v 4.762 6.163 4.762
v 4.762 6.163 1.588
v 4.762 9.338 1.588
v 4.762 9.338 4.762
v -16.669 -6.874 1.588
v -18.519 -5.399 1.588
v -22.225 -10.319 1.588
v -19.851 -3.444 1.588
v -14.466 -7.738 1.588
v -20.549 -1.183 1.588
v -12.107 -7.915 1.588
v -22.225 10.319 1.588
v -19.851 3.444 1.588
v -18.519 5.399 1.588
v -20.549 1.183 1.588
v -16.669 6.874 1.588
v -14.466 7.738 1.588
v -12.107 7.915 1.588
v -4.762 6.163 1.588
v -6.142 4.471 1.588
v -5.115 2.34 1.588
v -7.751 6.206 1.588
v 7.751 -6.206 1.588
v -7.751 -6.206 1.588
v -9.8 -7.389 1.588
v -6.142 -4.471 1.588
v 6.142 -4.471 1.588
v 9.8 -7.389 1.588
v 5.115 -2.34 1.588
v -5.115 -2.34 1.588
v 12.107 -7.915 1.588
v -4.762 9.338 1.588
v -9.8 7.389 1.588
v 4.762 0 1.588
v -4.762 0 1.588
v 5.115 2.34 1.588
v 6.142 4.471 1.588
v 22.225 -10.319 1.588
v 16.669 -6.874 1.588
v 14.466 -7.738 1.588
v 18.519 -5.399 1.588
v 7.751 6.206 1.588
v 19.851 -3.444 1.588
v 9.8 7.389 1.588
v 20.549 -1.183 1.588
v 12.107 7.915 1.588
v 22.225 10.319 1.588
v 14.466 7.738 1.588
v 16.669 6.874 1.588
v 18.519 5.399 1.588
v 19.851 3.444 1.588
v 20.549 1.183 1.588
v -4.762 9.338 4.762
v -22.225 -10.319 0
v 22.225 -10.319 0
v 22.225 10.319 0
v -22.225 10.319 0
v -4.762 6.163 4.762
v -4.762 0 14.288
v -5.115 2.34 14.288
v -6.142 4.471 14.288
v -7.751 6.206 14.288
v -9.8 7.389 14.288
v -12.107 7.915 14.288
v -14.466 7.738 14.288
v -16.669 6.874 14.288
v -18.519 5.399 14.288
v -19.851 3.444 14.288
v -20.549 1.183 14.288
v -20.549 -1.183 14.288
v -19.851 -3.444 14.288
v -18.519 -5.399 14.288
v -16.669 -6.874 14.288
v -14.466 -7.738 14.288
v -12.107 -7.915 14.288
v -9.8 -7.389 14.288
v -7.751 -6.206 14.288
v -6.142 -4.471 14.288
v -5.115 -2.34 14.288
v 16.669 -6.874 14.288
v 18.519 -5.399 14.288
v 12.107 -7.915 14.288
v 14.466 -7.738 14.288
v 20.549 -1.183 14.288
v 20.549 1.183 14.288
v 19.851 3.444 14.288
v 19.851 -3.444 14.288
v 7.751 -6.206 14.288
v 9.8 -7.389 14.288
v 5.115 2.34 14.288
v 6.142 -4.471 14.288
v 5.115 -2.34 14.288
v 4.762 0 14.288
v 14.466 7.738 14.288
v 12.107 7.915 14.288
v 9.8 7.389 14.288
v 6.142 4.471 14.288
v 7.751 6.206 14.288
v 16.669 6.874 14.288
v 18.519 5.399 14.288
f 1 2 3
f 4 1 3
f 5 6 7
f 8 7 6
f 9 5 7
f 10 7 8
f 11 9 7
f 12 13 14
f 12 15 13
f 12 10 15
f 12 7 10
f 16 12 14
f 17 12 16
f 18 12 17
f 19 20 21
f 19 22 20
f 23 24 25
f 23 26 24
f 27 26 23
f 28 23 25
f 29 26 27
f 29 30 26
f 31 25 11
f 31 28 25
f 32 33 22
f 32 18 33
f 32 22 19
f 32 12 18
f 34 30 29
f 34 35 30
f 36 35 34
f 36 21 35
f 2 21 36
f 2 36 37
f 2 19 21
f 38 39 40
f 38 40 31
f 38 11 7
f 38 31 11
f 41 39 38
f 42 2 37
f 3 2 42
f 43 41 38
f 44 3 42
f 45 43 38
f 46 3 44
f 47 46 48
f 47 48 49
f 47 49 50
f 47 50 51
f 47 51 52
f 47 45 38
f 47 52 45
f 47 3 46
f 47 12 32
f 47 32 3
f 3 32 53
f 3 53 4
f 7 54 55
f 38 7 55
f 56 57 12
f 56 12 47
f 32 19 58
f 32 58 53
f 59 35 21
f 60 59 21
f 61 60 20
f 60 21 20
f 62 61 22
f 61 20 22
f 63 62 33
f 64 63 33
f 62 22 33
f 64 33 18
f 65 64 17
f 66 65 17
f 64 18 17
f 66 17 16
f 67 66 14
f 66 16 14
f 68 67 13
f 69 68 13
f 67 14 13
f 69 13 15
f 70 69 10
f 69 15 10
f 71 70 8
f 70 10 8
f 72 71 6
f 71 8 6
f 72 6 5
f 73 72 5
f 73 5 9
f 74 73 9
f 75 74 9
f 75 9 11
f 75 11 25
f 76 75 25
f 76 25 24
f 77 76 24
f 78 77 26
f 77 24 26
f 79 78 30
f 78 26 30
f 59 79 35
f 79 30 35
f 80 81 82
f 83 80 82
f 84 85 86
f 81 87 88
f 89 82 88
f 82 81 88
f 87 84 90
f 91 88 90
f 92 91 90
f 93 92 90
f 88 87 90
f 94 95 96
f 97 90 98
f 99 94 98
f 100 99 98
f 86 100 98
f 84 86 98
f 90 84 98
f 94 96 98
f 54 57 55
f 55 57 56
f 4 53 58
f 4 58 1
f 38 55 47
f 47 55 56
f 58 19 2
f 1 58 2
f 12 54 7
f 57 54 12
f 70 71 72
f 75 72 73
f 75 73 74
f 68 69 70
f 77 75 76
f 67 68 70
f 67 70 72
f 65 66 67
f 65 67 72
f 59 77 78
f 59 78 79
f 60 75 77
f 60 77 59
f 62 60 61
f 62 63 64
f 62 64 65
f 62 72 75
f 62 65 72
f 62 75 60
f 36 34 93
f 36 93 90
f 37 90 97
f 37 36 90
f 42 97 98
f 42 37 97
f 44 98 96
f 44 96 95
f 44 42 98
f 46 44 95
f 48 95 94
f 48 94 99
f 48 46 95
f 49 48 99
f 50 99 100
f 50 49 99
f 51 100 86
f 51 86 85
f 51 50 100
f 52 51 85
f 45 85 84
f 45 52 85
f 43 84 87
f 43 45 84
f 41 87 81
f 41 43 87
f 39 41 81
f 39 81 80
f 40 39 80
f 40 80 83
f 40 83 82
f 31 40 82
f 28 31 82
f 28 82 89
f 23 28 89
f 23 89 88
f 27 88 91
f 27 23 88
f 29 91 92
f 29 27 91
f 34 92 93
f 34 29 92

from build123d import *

# Parameters (mm, degrees)
SKETCH1_W           = 44.45
SKETCH1_H           = 20.6375
BOSS_EXTRUDE1_DEPTH = 1.5875
SKETCH2_R           = 7.9375
BOSS_EXTRUDE2_DEPTH = 12.7
SKETCH3_W           = 9.525
SKETCH3_H           = 3.175
BOSS_EXTRUDE3_DEPTH = 3.175


with BuildPart() as part:
    # Sketch1 → Boss-Extrude1 (new body)
    with BuildSketch(Plane.XY):
        Rectangle(SKETCH1_W, SKETCH1_H)
    extrude(amount=BOSS_EXTRUDE1_DEPTH)

    # Sketch2 → Boss-Extrude2 (add)
    with BuildSketch(Plane.XY.offset(1.5875)):
        with Locations((-12.7, 0)):
            Circle(SKETCH2_R)
    boss_extrude2 = extrude(amount=BOSS_EXTRUDE2_DEPTH)

    # Mirror1: Boss-Extrude2 across plane
    add(boss_extrude2.mirror(Plane(origin=(0, 0, 0), x_dir=(0, 0, 1), z_dir=(1, 0, 0))))

    # Sketch3 → Boss-Extrude3 (add)
    with BuildSketch(Plane.XY.offset(1.5875)):
        with Locations((0, 7.750431081)):
            Rectangle(SKETCH3_W, SKETCH3_H)
    extrude(amount=BOSS_EXTRUDE3_DEPTH)


solid = part.part
